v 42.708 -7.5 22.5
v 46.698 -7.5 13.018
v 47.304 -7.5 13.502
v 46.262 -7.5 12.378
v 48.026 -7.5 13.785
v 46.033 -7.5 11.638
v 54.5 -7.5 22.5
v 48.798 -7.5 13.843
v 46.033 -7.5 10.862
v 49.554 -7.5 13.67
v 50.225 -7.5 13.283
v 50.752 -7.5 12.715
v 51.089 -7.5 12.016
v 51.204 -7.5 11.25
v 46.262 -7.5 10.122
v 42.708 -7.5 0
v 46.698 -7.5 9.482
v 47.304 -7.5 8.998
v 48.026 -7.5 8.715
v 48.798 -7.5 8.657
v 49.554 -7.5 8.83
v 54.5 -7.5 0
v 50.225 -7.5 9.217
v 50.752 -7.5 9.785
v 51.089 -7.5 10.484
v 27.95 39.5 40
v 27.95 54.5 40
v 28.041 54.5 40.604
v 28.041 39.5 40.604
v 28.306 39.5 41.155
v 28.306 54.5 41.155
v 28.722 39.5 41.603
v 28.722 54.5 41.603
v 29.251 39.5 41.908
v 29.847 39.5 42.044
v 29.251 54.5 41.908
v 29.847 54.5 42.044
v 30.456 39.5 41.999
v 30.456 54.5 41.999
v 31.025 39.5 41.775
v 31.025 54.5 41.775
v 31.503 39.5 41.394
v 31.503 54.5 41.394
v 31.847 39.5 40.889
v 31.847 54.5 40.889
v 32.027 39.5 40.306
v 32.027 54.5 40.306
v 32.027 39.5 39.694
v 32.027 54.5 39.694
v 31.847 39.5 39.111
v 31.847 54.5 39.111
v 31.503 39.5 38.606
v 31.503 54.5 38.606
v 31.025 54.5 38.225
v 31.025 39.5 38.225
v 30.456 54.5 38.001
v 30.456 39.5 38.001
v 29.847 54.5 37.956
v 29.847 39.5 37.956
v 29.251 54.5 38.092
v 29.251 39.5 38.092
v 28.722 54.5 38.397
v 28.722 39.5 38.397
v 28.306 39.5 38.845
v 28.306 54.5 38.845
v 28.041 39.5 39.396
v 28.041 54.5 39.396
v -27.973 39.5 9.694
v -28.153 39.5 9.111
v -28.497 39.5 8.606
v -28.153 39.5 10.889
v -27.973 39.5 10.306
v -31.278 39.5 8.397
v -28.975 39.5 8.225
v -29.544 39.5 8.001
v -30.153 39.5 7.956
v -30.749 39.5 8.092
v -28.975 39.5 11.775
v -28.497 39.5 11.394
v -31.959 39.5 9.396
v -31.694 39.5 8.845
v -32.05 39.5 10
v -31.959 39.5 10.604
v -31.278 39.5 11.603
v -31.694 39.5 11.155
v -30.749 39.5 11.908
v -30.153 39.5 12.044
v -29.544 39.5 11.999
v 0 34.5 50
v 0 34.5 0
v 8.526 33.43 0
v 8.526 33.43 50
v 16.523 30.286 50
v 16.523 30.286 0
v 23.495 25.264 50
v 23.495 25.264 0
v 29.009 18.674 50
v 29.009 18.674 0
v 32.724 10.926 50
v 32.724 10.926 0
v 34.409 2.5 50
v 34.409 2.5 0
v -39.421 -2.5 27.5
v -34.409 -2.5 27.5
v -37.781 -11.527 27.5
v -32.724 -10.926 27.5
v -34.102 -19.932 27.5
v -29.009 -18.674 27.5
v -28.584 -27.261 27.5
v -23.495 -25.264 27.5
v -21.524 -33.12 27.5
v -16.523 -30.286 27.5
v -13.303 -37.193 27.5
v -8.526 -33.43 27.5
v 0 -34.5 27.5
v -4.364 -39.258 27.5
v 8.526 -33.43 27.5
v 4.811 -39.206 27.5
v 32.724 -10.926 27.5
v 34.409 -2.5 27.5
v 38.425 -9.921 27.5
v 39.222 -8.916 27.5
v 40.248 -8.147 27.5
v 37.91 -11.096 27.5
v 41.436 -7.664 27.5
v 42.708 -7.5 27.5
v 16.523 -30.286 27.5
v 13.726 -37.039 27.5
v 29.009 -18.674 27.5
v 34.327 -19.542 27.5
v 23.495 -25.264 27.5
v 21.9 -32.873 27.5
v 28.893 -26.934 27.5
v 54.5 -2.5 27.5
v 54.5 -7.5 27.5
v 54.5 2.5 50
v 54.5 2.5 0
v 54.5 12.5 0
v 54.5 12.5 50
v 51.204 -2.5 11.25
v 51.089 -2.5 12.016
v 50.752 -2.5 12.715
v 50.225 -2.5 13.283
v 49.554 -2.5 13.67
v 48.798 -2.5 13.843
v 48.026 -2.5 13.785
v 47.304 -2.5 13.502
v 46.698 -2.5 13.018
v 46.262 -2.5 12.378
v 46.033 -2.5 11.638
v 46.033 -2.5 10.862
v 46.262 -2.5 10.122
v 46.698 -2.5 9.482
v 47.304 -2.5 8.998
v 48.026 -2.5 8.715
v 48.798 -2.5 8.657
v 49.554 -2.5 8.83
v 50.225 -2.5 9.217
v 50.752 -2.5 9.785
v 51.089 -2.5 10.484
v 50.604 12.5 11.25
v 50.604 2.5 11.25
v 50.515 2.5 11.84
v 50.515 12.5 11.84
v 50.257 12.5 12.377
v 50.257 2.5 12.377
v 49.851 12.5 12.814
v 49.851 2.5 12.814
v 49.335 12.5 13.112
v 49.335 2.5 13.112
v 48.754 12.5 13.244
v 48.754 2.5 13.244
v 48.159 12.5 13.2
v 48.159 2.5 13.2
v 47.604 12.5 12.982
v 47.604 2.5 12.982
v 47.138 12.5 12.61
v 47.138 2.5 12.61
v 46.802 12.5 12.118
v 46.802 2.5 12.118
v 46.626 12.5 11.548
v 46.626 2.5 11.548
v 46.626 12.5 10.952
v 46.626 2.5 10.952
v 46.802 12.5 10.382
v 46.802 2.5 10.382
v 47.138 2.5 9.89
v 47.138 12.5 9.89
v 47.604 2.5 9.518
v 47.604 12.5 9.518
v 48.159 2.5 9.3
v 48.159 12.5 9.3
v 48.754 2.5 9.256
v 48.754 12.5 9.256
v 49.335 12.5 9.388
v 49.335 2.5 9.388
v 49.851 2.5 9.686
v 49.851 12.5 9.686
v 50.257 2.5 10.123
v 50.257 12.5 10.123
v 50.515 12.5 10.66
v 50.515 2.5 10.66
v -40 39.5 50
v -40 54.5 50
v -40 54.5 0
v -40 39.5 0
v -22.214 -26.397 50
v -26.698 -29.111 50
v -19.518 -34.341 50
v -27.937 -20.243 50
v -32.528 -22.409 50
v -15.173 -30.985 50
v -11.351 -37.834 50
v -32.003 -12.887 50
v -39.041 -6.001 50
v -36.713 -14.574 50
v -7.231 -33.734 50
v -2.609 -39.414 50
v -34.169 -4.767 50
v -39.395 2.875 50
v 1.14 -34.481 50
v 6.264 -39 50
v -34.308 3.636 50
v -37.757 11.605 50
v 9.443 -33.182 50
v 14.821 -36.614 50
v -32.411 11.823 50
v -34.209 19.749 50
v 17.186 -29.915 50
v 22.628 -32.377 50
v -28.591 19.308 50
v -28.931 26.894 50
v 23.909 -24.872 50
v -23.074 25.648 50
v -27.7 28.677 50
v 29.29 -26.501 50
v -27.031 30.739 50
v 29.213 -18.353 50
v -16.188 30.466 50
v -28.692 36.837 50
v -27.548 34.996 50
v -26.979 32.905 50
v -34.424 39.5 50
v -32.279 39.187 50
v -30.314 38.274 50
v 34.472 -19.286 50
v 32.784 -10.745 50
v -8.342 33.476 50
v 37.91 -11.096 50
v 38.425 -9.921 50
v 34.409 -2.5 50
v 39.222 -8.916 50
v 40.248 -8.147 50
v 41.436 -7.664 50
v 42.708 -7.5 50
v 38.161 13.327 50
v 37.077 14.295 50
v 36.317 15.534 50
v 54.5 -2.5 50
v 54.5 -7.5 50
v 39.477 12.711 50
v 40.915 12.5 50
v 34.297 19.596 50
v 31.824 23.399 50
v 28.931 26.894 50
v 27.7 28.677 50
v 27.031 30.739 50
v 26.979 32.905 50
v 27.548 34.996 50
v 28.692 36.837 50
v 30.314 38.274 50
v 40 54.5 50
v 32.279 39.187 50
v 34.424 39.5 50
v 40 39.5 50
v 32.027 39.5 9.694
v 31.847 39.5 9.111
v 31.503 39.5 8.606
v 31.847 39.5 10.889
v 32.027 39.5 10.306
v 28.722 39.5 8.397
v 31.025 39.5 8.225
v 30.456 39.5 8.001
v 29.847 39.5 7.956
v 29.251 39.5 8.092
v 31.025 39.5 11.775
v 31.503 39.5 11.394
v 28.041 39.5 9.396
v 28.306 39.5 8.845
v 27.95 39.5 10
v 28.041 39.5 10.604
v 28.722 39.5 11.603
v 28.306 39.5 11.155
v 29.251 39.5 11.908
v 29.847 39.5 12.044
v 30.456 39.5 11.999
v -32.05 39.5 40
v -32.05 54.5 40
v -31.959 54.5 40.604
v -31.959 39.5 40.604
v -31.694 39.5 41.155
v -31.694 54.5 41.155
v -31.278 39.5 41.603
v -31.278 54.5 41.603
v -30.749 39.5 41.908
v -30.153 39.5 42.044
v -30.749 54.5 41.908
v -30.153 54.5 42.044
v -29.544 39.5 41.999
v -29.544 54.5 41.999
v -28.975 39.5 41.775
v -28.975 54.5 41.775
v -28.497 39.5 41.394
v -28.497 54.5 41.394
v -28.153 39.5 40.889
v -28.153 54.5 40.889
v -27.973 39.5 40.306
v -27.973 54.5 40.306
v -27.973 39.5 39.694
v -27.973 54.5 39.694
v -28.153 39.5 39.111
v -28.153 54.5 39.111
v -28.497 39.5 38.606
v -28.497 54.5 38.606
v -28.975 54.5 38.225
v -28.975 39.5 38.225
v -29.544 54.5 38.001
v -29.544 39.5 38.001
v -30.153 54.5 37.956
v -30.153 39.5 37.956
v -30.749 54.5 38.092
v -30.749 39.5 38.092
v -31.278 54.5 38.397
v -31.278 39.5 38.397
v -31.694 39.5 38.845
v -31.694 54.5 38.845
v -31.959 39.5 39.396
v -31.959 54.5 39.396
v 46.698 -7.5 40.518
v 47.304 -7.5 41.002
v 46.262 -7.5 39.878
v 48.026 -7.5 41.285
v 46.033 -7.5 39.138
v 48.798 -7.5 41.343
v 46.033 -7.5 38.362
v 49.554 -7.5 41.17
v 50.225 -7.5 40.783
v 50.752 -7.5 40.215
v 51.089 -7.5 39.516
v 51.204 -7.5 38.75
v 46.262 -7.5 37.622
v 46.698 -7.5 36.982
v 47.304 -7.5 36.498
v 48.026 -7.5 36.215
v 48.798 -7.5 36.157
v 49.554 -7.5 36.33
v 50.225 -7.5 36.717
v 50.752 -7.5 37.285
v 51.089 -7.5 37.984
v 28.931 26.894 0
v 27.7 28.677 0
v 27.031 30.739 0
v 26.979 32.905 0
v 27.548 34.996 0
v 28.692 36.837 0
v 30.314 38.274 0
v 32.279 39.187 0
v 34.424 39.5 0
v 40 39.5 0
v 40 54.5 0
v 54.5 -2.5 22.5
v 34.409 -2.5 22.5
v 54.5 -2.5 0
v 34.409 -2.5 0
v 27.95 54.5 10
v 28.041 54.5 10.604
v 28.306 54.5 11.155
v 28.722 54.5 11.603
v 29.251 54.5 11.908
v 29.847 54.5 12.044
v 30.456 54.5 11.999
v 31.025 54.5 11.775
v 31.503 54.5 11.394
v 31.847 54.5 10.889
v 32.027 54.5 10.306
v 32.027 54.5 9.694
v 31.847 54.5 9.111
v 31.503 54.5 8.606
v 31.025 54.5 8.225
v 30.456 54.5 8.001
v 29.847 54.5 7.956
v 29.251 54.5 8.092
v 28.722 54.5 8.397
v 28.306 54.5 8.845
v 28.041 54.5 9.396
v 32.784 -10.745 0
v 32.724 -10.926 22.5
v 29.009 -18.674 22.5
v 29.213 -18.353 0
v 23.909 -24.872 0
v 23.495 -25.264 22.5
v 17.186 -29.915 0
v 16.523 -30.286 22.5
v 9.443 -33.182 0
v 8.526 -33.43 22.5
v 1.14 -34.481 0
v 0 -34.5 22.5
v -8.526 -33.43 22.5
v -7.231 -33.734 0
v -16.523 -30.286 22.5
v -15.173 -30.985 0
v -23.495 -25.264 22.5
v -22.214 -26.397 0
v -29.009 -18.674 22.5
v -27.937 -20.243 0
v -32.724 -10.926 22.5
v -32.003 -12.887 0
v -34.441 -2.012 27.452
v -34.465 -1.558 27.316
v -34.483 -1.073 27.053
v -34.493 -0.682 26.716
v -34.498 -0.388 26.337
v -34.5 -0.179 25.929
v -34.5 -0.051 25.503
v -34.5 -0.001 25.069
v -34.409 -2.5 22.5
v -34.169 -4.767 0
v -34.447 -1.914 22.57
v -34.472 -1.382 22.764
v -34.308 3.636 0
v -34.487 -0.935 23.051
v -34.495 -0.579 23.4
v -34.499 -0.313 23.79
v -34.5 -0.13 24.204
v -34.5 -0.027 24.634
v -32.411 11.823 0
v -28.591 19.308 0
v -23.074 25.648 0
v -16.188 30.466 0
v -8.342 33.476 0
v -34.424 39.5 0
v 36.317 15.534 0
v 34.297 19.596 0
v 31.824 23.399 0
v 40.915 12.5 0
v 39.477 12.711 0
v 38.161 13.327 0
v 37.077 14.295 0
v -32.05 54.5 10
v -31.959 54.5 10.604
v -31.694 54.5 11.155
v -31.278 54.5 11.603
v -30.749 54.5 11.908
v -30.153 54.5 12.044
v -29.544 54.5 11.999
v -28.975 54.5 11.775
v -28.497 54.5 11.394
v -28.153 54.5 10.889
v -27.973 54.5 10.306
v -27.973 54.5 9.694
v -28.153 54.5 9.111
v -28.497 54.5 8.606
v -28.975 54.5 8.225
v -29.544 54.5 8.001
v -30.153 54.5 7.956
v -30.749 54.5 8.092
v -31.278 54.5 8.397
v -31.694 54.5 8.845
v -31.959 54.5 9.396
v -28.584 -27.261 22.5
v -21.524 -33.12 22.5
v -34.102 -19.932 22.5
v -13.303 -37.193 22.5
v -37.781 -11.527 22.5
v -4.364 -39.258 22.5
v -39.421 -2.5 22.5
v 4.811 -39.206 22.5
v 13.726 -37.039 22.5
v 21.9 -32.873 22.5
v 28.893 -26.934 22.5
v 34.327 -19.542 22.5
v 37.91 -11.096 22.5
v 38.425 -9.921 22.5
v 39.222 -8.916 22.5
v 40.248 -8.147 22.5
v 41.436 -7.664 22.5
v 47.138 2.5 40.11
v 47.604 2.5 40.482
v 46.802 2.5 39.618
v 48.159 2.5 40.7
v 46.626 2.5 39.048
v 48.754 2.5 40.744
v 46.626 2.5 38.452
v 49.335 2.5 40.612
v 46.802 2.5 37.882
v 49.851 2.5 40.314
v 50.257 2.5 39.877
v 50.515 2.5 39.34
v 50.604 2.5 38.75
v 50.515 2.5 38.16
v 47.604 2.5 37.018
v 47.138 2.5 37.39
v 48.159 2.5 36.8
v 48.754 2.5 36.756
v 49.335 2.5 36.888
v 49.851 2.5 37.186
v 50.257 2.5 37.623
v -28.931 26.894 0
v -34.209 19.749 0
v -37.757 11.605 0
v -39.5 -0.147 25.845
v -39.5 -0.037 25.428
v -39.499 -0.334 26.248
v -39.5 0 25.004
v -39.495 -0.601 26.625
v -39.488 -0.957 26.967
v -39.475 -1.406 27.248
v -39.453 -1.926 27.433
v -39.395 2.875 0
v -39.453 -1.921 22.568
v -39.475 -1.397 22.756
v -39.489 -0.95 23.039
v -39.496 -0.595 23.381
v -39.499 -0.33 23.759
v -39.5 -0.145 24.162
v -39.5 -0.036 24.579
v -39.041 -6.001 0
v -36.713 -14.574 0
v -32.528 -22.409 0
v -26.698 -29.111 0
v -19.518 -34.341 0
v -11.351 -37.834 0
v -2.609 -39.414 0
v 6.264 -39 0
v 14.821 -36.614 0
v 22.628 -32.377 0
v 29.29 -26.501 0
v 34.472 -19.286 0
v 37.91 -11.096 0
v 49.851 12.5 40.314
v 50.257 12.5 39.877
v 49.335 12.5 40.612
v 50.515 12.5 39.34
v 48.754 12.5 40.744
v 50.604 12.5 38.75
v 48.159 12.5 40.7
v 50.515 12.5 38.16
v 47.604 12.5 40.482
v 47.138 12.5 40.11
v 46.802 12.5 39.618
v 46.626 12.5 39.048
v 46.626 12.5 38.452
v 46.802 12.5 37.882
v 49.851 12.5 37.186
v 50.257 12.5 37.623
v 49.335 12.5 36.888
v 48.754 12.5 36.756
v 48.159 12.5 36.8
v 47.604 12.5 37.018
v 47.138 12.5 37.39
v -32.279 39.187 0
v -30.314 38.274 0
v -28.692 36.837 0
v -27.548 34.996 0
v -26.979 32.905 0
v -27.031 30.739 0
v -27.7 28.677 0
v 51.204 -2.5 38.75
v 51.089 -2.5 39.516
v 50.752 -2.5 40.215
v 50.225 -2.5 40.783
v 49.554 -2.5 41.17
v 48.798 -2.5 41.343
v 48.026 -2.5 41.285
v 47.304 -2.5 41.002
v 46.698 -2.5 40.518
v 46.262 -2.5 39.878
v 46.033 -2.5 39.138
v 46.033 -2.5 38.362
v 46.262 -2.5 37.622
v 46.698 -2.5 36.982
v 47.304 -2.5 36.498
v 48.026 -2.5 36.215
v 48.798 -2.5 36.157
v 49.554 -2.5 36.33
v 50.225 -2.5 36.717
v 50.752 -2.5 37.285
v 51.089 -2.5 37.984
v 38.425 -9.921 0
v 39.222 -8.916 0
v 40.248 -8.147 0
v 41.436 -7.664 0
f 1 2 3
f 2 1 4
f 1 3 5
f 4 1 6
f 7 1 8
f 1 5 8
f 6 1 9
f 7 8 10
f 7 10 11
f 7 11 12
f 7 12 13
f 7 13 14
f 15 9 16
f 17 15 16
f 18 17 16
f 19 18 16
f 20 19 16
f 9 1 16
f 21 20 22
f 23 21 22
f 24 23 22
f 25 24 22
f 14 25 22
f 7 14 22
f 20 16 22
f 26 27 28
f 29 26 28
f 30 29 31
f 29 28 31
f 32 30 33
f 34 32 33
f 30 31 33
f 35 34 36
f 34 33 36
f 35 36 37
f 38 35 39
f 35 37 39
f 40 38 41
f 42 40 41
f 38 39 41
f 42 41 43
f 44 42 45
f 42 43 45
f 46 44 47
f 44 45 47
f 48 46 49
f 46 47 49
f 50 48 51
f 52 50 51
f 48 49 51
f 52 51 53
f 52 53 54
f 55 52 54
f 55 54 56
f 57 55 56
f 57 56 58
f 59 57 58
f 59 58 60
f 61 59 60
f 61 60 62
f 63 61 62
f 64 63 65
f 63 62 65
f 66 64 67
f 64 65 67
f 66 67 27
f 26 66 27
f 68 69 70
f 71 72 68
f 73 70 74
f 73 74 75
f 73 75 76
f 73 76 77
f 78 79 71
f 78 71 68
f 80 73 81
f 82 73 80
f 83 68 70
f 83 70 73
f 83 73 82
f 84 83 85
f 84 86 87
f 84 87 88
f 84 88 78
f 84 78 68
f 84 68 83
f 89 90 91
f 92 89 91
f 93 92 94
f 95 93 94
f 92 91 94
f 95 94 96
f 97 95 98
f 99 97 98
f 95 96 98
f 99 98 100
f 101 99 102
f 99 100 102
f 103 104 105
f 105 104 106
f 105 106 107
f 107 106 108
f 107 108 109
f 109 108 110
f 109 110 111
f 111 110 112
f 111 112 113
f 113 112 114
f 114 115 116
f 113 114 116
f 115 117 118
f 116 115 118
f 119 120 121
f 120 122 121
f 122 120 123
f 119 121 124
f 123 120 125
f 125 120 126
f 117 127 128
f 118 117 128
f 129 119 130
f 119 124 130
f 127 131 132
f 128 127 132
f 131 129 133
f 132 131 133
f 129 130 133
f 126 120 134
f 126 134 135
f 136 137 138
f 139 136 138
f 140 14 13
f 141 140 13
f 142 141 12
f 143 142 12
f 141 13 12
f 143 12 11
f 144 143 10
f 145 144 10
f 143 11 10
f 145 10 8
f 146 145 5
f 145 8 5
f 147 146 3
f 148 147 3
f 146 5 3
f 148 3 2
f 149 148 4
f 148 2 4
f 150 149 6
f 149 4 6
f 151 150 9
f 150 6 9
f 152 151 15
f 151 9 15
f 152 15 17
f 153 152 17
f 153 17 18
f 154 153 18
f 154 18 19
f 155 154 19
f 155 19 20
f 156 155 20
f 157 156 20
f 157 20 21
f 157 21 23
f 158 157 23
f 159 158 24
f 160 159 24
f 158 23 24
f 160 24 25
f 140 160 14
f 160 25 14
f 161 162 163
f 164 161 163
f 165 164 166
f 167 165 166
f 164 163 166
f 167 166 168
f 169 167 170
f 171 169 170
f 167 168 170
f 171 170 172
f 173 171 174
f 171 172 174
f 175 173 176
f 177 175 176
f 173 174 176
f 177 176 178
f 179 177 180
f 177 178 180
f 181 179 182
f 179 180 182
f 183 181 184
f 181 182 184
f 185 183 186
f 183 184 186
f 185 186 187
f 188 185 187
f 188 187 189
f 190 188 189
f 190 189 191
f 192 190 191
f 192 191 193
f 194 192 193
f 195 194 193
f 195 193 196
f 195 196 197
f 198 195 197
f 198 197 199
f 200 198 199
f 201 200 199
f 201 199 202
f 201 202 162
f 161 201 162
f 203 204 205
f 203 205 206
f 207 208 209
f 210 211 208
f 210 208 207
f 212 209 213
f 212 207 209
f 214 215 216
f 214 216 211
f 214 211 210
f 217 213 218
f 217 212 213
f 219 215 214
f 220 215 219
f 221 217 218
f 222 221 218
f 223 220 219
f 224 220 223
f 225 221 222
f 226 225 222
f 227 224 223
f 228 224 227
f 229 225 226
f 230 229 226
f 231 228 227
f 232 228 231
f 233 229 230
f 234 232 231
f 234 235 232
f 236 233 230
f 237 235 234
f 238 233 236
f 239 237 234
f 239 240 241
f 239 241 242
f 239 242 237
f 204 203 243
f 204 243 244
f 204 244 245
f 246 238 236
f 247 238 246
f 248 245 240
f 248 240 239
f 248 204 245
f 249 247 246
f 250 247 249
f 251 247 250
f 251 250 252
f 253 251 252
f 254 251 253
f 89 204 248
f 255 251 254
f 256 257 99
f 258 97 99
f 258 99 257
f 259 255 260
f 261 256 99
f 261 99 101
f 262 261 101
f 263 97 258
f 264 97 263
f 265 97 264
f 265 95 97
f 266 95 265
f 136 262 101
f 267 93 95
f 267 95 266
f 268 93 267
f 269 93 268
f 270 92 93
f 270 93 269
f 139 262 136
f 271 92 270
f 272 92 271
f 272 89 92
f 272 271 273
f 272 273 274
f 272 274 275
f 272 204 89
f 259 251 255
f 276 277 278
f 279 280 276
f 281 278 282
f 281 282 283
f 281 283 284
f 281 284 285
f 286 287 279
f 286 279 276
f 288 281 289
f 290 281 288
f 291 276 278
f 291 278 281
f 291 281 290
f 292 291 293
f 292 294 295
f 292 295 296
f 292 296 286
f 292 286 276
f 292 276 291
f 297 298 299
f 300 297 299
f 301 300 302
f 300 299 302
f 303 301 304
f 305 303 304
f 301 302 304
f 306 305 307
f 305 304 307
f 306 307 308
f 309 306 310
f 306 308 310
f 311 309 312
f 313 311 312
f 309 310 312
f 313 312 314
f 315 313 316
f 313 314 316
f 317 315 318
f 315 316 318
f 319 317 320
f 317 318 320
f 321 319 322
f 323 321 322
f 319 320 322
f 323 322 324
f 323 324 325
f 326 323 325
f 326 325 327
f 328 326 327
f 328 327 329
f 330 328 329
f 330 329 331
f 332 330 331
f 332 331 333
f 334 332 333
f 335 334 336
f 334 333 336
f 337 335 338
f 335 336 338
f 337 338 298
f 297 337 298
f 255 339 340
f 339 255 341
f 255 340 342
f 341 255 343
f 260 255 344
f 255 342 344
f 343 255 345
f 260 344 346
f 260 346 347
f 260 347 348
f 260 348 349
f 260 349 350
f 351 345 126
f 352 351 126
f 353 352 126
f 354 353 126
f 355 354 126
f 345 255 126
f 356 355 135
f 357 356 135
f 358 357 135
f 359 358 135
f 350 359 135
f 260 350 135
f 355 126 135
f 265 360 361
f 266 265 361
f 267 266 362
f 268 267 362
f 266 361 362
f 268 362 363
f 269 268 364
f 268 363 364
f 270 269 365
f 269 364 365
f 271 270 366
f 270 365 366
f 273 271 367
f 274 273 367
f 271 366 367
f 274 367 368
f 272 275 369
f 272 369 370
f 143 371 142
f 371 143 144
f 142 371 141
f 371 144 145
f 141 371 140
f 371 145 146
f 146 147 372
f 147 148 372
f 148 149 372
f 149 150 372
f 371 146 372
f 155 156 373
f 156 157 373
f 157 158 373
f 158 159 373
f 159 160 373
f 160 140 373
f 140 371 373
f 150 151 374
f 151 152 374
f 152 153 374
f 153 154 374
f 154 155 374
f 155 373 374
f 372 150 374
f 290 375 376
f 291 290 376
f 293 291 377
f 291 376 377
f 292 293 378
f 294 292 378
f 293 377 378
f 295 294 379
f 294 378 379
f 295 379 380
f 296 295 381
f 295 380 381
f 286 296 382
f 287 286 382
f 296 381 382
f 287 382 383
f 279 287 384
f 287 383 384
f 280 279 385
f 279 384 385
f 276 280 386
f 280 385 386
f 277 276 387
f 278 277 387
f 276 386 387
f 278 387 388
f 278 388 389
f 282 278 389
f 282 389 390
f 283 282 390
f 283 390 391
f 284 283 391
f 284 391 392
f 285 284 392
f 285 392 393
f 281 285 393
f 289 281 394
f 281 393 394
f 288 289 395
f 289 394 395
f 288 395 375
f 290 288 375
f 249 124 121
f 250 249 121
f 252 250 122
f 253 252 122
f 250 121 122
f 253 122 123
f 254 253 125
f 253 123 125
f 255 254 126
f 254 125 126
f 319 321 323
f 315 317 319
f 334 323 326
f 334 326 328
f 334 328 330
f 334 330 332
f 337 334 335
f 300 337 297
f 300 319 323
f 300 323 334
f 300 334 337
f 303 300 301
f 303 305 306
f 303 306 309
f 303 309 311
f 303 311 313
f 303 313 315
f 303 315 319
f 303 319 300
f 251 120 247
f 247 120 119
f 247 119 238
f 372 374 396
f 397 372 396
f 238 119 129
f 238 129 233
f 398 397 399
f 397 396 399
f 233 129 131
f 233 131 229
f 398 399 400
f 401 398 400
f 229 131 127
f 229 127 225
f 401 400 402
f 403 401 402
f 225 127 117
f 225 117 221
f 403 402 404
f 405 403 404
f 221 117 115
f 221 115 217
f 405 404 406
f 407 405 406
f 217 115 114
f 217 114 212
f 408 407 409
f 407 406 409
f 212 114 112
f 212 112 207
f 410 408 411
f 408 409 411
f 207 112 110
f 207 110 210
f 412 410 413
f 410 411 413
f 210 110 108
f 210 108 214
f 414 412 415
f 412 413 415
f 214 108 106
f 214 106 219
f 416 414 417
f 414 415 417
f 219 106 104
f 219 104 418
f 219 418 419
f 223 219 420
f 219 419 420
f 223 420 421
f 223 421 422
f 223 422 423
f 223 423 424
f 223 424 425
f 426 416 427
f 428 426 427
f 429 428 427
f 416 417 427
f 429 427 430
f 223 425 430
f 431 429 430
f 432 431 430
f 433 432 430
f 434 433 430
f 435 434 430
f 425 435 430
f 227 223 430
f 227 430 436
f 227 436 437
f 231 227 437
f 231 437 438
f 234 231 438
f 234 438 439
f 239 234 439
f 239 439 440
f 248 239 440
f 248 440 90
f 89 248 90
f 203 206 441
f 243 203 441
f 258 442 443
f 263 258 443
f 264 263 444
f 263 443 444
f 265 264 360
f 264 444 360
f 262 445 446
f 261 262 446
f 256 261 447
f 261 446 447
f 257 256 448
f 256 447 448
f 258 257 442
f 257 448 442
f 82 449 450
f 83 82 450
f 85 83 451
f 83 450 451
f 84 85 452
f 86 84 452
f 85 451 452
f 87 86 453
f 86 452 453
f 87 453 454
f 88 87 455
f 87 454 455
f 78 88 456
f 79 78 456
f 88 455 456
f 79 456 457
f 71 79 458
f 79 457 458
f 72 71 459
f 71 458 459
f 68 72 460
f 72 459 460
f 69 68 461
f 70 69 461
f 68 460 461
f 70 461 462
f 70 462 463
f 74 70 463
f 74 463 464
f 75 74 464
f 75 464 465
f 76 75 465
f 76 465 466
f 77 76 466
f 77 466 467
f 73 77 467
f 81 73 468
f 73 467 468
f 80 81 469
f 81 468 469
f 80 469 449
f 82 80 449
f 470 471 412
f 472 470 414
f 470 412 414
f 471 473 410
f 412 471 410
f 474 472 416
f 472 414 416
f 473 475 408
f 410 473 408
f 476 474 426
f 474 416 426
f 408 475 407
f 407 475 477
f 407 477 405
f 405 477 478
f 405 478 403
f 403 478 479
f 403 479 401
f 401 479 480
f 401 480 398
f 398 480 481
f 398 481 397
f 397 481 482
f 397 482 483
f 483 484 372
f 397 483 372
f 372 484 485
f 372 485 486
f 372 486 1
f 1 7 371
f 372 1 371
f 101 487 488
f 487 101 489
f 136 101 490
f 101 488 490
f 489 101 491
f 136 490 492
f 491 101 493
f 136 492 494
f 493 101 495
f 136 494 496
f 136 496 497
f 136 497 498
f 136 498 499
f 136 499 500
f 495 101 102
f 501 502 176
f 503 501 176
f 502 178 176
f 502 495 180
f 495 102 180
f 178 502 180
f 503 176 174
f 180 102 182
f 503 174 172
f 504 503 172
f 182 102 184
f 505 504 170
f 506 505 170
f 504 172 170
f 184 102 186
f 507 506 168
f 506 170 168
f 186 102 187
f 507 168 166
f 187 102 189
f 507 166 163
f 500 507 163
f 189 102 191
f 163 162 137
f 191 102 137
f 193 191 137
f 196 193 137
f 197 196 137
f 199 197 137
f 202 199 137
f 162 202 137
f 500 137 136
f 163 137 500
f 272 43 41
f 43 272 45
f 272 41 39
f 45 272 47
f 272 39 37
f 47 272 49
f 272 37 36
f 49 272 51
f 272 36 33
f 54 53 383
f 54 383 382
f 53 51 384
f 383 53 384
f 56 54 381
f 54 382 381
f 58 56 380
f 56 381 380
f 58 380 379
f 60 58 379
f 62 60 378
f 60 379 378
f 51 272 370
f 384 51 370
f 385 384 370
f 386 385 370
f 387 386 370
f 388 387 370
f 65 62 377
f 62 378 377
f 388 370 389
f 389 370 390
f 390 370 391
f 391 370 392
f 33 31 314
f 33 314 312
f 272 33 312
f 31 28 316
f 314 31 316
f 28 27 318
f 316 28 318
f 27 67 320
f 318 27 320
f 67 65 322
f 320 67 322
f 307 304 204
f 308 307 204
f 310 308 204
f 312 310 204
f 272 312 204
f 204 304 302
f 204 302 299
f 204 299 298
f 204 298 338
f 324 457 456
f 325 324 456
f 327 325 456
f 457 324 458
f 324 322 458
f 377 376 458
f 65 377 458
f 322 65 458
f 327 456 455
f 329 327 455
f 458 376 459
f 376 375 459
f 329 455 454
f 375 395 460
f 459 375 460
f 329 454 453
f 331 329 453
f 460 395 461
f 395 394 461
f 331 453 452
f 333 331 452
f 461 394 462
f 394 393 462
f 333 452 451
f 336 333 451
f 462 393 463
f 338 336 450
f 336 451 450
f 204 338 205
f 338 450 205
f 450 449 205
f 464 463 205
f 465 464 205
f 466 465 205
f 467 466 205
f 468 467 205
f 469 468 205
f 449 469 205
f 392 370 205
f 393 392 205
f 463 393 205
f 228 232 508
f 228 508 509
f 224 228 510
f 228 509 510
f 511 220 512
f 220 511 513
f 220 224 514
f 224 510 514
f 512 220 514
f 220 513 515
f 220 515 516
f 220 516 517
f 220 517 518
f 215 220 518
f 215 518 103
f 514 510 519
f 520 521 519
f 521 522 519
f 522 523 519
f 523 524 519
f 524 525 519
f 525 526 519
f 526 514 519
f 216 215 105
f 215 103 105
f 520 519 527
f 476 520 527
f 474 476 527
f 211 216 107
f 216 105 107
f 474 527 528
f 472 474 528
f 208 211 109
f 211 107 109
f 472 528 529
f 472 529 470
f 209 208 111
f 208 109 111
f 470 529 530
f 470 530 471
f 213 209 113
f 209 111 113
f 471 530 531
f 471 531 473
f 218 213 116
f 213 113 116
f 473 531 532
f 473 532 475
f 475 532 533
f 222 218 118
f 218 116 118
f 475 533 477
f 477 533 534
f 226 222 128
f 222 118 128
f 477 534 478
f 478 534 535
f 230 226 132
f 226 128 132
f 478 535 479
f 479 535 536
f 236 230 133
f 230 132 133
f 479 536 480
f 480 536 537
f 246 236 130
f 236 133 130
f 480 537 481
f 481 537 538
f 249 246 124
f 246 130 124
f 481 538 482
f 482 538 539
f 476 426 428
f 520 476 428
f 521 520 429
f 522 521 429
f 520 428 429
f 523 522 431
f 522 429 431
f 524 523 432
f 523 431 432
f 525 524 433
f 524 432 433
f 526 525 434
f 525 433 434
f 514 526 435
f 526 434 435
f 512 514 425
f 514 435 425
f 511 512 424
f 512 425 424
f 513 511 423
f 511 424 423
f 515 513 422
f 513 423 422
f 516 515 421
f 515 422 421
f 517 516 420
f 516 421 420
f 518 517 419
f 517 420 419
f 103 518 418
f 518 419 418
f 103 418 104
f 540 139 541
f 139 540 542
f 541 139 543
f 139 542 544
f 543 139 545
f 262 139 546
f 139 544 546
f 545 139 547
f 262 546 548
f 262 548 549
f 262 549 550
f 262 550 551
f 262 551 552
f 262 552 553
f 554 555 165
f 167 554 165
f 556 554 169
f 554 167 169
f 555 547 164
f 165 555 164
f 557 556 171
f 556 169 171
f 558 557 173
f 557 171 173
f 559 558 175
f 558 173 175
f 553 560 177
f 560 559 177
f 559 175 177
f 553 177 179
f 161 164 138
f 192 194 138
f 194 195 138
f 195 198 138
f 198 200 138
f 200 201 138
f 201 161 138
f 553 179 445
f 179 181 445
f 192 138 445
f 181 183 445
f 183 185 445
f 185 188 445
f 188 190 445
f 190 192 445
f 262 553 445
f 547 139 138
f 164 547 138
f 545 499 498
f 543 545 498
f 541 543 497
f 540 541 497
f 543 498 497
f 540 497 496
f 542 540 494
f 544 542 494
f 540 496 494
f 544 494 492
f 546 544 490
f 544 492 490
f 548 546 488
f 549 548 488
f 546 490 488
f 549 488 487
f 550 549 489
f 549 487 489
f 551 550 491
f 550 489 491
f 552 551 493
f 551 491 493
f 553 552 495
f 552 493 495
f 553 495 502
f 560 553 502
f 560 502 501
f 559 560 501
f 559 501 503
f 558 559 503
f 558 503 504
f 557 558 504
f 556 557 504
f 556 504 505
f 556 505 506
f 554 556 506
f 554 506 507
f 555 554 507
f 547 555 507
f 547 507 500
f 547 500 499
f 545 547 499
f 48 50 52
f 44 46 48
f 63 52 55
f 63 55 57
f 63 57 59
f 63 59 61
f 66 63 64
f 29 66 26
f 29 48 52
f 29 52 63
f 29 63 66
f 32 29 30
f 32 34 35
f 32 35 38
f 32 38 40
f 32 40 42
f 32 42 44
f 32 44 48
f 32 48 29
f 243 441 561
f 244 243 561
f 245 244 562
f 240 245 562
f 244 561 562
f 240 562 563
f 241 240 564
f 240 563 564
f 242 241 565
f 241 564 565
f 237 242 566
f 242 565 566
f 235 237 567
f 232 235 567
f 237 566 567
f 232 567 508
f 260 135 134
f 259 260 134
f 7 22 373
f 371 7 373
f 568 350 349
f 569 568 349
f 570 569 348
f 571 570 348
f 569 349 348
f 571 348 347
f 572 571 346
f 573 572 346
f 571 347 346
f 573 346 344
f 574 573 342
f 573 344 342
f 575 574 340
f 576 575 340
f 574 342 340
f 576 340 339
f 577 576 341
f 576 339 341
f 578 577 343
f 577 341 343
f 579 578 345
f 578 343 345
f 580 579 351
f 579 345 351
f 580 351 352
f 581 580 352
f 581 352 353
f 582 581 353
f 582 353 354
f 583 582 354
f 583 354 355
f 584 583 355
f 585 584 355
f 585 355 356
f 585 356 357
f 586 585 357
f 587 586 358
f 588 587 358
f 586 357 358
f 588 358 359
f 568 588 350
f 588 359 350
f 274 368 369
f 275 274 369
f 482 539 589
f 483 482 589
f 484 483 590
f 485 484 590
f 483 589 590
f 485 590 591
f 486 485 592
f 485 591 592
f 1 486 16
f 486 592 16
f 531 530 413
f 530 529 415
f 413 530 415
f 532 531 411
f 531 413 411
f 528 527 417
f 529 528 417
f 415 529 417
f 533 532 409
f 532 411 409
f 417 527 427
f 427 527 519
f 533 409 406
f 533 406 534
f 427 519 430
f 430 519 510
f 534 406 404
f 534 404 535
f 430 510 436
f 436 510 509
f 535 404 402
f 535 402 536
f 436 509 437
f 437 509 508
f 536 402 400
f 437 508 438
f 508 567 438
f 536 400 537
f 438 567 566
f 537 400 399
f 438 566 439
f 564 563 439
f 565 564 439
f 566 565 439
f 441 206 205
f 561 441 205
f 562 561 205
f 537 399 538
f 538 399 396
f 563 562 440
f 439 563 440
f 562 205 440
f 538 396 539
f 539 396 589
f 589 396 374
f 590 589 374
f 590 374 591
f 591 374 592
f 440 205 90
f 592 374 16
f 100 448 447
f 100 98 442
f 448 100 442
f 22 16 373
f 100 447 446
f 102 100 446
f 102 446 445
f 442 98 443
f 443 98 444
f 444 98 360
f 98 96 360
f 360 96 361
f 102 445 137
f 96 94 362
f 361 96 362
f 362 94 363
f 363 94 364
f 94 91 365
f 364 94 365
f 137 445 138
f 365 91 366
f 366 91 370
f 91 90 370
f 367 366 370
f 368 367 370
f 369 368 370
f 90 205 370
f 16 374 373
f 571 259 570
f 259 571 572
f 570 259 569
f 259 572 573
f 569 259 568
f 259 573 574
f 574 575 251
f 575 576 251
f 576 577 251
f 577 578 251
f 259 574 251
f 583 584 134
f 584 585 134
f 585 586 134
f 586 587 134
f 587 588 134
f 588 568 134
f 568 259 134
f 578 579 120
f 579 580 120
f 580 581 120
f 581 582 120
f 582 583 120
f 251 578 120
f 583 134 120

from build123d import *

# Parameters (mm, degrees)
F1_DEPTH = 50
F2_R     = 2.05
F3_DEPTH = 15
F5_R     = 2
F6_DEPTH = 62.001
F5_R_2   = 2.6
F7_DEPTH = 5
F9_DEPTH = 100


with BuildPart() as f1:
    # F0 (on Top) → F1 (new body)
    with BuildSketch(Plane.XY):
        with BuildLine():
            ThreePointArc((34.409301, -2.5), (-25.26361, -23.49468), (0, 34.5))
            Line((0, 34.5), (0, 54.5))
            Line((0, 54.5), (-40, 54.5))
            Line((-40, 54.5), (-40, 39.5))
            Line((-40, 39.5), (-34.423829, 39.5))
            ThreePointArc((-34.423829, 39.5), (-27.548225, 34.996008), (-28.930665, 26.893617))
            ThreePointArc((-28.930665, 26.893617), (-19.51791, -34.340955), (37.909626, -11.095506))
            ThreePointArc((37.909626, -11.095506), (39.710186, -8.498596), (42.708313, -7.5))
            Line((42.708313, -7.5), (54.5, -7.5))
            Line((54.5, -7.5), (54.5, -2.5))
            Line((54.5, -2.5), (34.409301, -2.5))
        make_face()
        with BuildLine():
            ThreePointArc((0, 34.5), (23.49468, 25.26361), (34.409301, 2.5))
            Line((34.409301, 2.5), (54.5, 2.5))
            Line((54.5, 2.5), (54.5, 7.5))
            Line((54.5, 7.5), (54.5, 12.5))
            Line((54.5, 12.5), (40.914545, 12.5))
            ThreePointArc((40.914545, 12.5), (38.16059, 13.326784), (36.317405, 15.533708))
            ThreePointArc((36.317405, 15.533708), (33.114793, 21.532776), (28.930665, 26.893617))
            ThreePointArc((28.930665, 26.893617), (27.548225, 34.996008), (34.423829, 39.5))
            Line((34.423829, 39.5), (40, 39.5))
            Line((40, 39.5), (40, 54.5))
            Line((40, 54.5), (0, 54.5))
            Line((0, 54.5), (0, 34.5))
        make_face()
    extrude(amount=F1_DEPTH)

    # F2 (on face) → F3 (cut)
    with BuildSketch(Plane(origin=(0, 54.5, 0), x_dir=(-1, 0, 0), z_dir=(0, 1, 0))):
        with Locations((-30, 10)):
            Circle(F2_R)
        with Locations((-30, 40)):
            Circle(F2_R)
        with Locations((30, 40)):
            Circle(F2_R)
        with Locations((30, 10)):
            Circle(F2_R)
    extrude(amount=-F3_DEPTH, mode=Mode.SUBTRACT)

    # F5 (on face) → F6 (cut, through all)
    with BuildSketch(Plane.XZ.offset(7.5)):
        with Locations((48.604157, 11.25)):
            Circle(F5_R)
        with Locations((48.604157, 38.75)):
            Circle(F5_R)
    extrude(amount=-F6_DEPTH, mode=Mode.SUBTRACT)

    # F5 (on face) → F7 (cut, through all)
    with BuildSketch(Plane.XZ.offset(7.5)):
        with Locations((48.604157, 11.25)):
            Circle(F5_R_2)
        with Locations((48.604157, 11.25)):
            Circle(F5_R, mode=Mode.SUBTRACT)
        with Locations((48.604157, 38.75)):
            Circle(F5_R_2)
        with Locations((48.604157, 38.75)):
            Circle(F5_R, mode=Mode.SUBTRACT)
    extrude(amount=-F7_DEPTH, mode=Mode.SUBTRACT)

    # F8 (on Right) → F9 (cut, symmetric)
    with BuildSketch(Plane.YZ):
        with BuildLine():
            ThreePointArc((-2.5, 22.5), (0, 25), (-2.5, 27.5))
            Line((-2.5, 27.5), (-48.95404, 27.5))
            ThreePointArc((-48.95404, 27.5), (-51.45404, 25), (-48.95404, 22.5))
            Line((-48.95404, 22.5), (-2.5, 22.5))
        make_face()
    extrude(amount=F9_DEPTH, both=True, mode=Mode.SUBTRACT)


solid = f1.part
